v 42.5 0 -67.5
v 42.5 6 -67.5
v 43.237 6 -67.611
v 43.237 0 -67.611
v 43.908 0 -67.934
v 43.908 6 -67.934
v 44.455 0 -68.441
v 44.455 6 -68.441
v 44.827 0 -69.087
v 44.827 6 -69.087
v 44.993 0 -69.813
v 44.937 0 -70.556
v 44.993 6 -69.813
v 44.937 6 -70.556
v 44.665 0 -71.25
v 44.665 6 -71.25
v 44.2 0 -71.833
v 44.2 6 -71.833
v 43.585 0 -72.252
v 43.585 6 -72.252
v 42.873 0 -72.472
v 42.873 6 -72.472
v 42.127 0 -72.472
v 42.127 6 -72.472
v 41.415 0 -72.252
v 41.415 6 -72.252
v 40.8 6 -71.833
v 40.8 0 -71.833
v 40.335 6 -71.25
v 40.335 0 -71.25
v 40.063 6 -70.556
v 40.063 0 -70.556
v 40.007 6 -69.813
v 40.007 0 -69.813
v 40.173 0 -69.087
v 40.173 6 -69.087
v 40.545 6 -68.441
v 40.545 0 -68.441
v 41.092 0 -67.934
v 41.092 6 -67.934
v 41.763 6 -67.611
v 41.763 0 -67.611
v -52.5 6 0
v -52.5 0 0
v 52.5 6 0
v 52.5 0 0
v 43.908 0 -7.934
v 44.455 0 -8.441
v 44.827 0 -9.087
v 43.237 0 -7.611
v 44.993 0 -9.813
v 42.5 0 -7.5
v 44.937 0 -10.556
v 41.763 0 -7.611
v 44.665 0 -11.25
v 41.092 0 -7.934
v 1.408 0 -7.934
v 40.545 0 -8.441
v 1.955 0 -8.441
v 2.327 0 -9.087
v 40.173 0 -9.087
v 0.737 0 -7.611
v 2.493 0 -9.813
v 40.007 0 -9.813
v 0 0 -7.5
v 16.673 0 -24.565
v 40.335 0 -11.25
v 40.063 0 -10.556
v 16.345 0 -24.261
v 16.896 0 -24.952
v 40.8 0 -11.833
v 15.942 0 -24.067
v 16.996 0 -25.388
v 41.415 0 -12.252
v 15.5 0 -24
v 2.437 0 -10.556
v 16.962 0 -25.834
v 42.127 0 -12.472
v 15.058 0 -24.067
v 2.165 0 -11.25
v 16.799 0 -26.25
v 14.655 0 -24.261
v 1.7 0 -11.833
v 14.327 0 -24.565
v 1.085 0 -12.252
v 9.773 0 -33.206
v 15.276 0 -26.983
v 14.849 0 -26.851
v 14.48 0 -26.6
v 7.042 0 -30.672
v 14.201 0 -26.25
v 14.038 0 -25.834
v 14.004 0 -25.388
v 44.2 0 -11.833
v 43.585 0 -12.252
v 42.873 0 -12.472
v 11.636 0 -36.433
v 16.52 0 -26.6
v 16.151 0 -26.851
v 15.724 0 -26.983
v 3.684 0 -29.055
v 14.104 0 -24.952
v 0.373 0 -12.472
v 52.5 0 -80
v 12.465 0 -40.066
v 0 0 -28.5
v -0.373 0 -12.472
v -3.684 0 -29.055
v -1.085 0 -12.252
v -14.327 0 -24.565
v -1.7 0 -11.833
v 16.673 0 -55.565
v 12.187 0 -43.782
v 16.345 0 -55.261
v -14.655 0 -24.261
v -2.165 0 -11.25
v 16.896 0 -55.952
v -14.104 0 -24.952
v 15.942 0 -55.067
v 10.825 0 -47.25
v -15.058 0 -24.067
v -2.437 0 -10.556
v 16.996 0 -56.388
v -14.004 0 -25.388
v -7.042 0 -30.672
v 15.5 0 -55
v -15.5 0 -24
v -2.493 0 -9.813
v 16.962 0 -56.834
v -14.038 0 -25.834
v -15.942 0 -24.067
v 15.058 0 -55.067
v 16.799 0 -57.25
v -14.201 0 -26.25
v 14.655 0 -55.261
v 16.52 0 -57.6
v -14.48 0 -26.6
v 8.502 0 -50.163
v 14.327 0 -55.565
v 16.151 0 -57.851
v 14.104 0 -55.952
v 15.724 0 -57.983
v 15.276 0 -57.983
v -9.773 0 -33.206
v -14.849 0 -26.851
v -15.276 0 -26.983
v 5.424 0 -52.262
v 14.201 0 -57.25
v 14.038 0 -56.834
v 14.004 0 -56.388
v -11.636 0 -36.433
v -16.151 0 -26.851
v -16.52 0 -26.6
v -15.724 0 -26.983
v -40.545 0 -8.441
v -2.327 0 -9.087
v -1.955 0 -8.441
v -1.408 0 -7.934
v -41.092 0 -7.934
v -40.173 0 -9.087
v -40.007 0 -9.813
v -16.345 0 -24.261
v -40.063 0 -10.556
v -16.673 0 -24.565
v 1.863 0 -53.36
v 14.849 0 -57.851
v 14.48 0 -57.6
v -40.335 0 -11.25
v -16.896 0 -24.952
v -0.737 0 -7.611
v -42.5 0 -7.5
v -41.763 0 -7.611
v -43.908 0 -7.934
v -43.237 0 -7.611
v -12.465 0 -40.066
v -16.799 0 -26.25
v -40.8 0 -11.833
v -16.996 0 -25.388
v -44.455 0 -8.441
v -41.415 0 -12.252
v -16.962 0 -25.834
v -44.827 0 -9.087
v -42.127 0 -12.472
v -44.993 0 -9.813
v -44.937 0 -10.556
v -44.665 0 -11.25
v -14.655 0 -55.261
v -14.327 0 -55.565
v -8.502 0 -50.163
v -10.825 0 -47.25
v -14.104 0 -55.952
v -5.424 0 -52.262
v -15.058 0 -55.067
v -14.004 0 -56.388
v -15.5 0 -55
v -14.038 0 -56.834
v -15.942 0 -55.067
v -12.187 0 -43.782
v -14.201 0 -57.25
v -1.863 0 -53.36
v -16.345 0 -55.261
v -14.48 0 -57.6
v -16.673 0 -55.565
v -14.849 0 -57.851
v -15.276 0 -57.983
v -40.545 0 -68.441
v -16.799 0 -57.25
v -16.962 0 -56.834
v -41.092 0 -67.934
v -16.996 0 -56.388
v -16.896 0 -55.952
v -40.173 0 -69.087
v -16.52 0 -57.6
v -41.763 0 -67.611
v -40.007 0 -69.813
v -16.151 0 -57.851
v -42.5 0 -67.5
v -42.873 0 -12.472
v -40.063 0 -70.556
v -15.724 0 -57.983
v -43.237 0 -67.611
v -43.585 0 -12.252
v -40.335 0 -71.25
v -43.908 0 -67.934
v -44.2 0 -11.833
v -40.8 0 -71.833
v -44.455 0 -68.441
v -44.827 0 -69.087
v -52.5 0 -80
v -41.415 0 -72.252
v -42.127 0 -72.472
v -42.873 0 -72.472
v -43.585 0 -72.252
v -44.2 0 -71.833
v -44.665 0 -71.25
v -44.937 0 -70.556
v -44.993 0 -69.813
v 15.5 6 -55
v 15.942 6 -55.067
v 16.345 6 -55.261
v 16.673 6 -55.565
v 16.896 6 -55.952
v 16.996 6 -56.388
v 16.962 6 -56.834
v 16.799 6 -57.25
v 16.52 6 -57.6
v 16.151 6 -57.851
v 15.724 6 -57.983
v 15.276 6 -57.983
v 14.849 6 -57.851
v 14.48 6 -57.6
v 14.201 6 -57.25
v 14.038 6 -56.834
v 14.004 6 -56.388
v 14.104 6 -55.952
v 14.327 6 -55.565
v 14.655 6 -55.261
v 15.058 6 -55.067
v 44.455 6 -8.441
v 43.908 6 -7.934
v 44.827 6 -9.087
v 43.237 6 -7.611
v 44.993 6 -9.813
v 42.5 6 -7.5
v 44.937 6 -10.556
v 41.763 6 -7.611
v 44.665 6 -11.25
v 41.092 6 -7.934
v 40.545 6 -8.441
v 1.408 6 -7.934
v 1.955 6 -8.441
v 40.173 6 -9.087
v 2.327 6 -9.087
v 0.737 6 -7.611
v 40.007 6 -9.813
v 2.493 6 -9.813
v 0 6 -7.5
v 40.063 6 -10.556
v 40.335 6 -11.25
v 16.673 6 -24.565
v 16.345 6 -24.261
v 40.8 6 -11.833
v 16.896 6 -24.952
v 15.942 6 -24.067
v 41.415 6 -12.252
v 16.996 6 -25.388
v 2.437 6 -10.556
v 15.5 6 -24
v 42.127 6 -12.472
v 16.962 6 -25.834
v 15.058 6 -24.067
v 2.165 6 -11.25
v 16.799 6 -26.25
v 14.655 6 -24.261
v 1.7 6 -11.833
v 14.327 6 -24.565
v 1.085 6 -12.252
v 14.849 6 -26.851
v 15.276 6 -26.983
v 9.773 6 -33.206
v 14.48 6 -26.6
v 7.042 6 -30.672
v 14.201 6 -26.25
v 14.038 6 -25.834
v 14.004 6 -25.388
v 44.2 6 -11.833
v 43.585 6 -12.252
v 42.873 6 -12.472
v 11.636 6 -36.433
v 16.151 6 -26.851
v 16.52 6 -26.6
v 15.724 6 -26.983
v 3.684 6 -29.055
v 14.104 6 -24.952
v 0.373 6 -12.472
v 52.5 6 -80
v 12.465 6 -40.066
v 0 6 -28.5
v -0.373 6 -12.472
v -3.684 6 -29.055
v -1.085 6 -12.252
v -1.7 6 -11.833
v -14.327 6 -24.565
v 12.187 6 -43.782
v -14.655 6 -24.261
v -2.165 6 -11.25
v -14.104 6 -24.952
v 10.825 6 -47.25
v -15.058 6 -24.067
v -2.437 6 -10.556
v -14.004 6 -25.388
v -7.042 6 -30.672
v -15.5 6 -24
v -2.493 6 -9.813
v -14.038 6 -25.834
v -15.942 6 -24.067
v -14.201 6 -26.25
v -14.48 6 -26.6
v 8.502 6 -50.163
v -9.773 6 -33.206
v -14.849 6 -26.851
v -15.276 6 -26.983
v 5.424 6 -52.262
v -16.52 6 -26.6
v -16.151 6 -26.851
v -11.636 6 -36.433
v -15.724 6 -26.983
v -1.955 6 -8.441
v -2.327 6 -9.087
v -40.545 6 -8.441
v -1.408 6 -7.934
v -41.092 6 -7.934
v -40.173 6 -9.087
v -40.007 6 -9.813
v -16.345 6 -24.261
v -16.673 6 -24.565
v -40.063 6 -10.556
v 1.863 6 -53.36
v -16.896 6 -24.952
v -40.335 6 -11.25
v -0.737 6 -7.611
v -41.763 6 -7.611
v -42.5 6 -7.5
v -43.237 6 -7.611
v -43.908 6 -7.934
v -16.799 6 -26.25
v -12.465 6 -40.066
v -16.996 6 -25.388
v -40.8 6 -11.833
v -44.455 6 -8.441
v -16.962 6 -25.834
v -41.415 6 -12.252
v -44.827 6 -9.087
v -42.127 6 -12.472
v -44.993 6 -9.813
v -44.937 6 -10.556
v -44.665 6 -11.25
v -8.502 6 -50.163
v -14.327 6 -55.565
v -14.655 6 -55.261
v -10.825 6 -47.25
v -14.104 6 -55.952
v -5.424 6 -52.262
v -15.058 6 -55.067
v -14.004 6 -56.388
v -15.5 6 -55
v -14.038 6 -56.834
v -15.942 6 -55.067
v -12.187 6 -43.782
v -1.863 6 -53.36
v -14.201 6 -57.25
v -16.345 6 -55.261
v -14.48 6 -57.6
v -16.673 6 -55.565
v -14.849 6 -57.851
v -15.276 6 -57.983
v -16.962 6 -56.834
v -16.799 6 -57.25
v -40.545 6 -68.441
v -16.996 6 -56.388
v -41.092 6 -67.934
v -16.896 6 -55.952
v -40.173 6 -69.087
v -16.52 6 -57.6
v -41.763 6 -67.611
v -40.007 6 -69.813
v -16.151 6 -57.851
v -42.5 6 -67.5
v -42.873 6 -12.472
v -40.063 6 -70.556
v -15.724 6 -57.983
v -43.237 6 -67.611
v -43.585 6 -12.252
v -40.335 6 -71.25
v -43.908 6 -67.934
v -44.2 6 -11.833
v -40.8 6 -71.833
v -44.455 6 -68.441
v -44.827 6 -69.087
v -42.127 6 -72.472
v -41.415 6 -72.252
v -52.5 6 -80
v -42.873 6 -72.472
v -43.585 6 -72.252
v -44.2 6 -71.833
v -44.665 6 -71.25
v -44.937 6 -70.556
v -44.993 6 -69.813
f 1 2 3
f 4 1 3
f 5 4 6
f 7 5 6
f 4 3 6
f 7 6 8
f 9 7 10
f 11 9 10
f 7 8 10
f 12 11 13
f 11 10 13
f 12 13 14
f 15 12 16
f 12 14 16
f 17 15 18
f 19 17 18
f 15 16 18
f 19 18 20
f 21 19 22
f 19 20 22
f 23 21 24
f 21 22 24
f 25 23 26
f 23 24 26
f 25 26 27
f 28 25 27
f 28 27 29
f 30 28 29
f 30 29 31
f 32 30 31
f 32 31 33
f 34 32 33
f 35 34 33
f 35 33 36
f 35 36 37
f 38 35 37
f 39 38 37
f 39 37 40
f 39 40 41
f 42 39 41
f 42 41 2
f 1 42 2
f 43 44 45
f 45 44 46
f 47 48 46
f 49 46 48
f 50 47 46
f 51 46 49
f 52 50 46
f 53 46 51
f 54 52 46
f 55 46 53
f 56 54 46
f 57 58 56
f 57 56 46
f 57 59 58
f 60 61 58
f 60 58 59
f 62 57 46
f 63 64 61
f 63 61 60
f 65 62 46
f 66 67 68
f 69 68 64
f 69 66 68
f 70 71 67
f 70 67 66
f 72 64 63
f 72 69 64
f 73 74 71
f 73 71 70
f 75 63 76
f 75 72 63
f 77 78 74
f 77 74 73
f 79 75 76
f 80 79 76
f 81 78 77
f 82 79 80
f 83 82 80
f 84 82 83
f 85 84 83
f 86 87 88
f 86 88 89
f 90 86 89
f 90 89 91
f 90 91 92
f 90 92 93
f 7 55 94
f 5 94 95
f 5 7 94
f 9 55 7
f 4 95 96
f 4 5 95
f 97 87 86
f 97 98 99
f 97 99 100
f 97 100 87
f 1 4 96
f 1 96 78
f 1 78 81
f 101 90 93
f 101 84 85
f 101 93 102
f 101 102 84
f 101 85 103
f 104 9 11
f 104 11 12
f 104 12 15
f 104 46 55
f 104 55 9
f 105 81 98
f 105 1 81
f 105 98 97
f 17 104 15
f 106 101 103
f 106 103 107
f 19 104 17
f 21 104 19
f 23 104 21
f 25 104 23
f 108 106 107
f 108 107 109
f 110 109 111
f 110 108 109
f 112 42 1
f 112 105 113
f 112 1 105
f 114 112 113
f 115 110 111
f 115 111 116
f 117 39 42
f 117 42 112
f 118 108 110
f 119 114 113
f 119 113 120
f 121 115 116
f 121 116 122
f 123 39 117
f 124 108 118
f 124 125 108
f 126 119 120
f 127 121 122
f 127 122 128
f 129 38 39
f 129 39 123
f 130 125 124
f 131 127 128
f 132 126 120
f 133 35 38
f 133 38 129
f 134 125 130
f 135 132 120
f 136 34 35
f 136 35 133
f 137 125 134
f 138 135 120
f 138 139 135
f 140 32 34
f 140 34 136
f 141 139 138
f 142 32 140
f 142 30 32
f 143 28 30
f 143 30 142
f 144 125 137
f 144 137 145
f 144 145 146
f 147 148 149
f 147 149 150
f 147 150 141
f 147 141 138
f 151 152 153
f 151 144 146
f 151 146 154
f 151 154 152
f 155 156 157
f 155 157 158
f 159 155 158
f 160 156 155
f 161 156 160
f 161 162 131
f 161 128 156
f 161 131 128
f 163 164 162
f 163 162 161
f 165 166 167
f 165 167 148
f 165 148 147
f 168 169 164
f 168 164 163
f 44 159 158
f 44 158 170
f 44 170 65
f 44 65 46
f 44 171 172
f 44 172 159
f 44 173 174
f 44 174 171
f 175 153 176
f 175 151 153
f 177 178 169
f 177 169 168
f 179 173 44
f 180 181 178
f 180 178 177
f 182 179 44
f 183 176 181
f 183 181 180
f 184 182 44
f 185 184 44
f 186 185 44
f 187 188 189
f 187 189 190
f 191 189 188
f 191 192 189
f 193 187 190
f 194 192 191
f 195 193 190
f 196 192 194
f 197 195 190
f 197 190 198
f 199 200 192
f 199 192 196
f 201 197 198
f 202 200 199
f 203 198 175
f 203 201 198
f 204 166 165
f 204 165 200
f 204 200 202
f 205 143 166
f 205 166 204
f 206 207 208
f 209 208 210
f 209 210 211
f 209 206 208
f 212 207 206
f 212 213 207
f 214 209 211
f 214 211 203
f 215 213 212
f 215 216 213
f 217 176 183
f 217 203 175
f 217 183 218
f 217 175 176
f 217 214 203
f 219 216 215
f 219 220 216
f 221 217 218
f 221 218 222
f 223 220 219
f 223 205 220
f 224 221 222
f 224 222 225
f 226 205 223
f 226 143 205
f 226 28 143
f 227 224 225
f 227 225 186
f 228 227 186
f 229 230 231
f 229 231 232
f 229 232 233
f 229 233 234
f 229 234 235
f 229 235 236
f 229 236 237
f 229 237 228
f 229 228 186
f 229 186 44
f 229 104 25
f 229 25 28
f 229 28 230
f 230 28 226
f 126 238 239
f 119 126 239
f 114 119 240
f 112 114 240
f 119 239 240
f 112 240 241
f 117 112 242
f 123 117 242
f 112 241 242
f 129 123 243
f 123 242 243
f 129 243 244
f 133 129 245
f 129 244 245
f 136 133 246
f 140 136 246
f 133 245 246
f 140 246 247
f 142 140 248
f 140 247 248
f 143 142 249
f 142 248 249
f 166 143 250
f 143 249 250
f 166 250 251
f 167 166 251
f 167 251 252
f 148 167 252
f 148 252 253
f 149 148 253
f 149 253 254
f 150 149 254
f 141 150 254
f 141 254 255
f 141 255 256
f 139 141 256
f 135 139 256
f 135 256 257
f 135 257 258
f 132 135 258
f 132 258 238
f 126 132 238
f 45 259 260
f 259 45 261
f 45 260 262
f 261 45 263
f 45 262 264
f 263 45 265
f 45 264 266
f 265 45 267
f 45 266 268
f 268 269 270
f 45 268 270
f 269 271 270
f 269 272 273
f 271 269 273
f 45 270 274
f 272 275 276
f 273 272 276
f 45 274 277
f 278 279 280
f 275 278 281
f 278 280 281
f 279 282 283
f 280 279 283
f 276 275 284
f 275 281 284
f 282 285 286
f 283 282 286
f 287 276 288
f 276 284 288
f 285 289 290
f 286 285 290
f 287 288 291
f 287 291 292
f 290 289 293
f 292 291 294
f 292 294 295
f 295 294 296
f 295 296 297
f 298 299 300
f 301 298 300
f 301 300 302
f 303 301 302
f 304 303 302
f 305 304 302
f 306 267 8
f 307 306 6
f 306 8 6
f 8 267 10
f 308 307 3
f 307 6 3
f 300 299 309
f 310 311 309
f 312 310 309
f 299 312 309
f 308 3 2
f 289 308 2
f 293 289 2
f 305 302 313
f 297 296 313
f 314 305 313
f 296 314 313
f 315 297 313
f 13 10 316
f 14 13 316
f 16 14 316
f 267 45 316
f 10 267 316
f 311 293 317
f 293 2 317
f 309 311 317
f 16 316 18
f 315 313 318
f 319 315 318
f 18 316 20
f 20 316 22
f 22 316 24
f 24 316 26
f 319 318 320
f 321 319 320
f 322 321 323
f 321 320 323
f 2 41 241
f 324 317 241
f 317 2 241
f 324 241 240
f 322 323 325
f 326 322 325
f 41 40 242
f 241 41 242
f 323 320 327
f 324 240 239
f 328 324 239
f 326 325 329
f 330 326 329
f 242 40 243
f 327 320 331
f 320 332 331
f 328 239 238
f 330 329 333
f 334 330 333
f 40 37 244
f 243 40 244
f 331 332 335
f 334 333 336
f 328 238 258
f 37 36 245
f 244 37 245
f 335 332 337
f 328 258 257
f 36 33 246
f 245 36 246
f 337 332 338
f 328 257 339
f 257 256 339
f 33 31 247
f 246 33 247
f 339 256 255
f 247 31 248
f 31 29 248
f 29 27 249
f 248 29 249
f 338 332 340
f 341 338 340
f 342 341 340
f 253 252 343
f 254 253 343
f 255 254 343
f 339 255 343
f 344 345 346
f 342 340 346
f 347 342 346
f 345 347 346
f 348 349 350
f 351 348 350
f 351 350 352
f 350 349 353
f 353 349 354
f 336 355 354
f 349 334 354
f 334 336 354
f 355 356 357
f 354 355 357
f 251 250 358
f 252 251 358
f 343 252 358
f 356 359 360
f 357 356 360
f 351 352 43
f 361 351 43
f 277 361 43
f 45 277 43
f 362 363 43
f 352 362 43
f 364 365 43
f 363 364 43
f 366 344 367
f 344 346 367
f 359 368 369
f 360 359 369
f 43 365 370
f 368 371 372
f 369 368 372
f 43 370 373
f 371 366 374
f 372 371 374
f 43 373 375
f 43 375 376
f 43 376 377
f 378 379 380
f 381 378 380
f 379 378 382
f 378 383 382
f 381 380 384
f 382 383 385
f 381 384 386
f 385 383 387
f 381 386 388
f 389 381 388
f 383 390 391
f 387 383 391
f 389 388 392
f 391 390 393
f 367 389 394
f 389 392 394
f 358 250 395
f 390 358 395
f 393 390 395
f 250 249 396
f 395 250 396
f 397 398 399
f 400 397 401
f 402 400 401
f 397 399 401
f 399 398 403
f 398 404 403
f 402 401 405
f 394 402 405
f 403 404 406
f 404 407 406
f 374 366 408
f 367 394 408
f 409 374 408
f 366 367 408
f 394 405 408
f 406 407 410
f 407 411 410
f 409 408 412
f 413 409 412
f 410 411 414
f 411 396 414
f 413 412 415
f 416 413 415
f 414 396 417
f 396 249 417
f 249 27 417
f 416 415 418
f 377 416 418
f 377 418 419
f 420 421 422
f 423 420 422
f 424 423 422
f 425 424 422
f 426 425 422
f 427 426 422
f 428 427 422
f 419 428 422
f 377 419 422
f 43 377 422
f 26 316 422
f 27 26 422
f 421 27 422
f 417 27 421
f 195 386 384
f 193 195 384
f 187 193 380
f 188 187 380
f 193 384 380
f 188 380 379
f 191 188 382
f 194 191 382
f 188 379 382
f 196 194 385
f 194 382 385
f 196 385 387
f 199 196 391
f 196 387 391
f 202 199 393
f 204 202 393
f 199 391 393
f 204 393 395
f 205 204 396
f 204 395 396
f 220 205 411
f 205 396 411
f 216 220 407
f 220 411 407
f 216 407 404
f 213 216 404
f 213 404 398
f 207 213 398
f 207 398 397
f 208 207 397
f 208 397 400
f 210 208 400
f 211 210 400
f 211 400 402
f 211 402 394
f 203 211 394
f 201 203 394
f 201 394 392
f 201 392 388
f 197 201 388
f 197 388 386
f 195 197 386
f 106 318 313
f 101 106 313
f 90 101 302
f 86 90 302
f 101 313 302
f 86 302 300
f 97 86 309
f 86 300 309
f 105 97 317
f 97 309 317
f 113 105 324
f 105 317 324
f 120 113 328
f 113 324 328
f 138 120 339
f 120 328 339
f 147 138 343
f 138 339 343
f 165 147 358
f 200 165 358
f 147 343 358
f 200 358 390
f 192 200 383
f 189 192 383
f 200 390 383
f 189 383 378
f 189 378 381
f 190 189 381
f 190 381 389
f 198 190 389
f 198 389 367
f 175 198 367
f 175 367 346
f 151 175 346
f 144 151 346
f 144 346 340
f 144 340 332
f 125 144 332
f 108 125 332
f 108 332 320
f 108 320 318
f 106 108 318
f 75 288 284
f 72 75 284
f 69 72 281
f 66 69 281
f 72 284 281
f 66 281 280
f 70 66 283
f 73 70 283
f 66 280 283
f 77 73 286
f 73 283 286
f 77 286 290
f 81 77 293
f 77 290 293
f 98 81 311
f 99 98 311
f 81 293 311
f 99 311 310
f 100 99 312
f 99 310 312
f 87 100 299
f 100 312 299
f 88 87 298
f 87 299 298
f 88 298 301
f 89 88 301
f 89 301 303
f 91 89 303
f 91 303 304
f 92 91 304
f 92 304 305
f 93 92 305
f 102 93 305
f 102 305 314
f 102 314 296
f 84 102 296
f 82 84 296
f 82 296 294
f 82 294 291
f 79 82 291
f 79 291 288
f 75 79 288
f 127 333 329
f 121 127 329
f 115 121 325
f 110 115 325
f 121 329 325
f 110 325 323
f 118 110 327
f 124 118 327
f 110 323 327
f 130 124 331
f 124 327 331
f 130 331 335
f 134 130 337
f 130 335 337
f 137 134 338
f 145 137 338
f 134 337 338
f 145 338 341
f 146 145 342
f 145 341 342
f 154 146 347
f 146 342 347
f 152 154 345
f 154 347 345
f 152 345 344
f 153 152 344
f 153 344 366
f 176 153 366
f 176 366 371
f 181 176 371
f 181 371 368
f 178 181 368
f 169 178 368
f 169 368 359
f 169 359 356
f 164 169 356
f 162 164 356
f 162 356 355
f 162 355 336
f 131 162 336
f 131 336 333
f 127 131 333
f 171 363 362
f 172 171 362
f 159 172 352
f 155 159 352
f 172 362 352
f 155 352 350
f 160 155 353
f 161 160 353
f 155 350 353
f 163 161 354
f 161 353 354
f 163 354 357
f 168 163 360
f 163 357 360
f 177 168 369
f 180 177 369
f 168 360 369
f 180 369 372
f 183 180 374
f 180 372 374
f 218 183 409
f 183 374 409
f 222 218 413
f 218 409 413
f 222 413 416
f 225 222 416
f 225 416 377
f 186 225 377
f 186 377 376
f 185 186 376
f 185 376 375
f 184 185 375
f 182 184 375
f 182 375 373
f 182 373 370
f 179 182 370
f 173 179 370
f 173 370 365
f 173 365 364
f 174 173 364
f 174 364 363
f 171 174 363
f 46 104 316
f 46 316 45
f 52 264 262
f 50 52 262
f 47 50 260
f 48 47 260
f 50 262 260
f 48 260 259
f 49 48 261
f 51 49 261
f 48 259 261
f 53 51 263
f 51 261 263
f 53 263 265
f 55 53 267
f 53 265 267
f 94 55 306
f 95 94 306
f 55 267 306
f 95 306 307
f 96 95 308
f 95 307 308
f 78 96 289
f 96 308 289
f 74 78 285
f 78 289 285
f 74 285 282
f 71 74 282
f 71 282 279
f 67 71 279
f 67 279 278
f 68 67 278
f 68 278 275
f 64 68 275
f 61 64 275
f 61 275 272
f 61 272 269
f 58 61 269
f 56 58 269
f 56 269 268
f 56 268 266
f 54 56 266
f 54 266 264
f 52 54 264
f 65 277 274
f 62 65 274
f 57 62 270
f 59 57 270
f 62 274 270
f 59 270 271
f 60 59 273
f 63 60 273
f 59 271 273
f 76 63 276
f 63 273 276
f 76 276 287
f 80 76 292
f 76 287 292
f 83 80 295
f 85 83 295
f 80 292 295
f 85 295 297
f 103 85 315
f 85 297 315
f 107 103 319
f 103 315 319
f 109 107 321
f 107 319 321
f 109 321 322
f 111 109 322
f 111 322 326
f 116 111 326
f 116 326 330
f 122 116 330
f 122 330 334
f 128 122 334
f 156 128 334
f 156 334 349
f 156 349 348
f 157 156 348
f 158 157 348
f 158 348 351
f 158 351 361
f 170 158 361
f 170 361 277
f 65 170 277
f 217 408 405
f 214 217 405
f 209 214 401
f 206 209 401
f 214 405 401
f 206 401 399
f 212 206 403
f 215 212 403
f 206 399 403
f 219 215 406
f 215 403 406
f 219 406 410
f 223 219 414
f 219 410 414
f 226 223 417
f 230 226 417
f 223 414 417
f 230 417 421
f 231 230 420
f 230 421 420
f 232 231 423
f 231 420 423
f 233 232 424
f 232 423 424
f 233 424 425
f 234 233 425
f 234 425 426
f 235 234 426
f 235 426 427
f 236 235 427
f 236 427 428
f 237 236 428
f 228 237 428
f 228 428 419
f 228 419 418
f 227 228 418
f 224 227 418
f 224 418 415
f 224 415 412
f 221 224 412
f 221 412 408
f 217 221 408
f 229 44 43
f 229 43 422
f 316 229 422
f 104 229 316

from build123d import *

# Parameters (mm, degrees)
BOSS_EXTRUDE1_DEPTH = 6
SKETCH2_R           = 2.5
SKETCH2_R_2         = 12.5
SKETCH2_R_3         = 1.5
CUT_EXTRUDE1_DEPTH  = 96.876222287


with BuildPart() as part:
    # Sketch1 → Boss-Extrude1 (new body)
    with BuildSketch(Plane(origin=(0, 0, 0), x_dir=(1, 0, 0), z_dir=(0, 1, 0))):
        Polygon((0, 0), (-52.5, 0), (-52.5, 80), (52.5, 80), (52.5, 0), align=None)
    extrude(amount=BOSS_EXTRUDE1_DEPTH)

    # Sketch2 → Cut-Extrude1 (cut, through all)
    with BuildSketch(Plane(origin=(0, 6, 0), x_dir=(1, 0, 0), z_dir=(0, 1, 0))):
        with Locations(Location((-42.5, 70, 0), (0, 0, 270))):
            Circle(SKETCH2_R)
        with Locations(Location((42.5, 70, 0), (0, 0, 270))):
            Circle(SKETCH2_R)
        with Locations(Location((42.5, 10, 0), (0, 0, 270))):
            Circle(SKETCH2_R)
        with Locations(Location((0, 10, 0), (0, 0, 270))):
            Circle(SKETCH2_R)
        with Locations(Location((-42.5, 10, 0), (0, 0, 270))):
            Circle(SKETCH2_R)
        with Locations(Location((0, 41, 0), (0, 0, 270))):
            Circle(SKETCH2_R_2)
        with Locations(Location((-15.5, 56.5, 0), (0, 0, 270))):
            Circle(SKETCH2_R_3)
        with Locations(Location((15.5, 56.5, 0), (0, 0, 270))):
            Circle(SKETCH2_R_3)
        with Locations(Location((-15.5, 25.5, 0), (0, 0, 270))):
            Circle(SKETCH2_R_3)
        with Locations(Location((15.5, 25.5, 0), (0, 0, 270))):
            Circle(SKETCH2_R_3)
    extrude(amount=-CUT_EXTRUDE1_DEPTH, mode=Mode.SUBTRACT)


solid = part.part
